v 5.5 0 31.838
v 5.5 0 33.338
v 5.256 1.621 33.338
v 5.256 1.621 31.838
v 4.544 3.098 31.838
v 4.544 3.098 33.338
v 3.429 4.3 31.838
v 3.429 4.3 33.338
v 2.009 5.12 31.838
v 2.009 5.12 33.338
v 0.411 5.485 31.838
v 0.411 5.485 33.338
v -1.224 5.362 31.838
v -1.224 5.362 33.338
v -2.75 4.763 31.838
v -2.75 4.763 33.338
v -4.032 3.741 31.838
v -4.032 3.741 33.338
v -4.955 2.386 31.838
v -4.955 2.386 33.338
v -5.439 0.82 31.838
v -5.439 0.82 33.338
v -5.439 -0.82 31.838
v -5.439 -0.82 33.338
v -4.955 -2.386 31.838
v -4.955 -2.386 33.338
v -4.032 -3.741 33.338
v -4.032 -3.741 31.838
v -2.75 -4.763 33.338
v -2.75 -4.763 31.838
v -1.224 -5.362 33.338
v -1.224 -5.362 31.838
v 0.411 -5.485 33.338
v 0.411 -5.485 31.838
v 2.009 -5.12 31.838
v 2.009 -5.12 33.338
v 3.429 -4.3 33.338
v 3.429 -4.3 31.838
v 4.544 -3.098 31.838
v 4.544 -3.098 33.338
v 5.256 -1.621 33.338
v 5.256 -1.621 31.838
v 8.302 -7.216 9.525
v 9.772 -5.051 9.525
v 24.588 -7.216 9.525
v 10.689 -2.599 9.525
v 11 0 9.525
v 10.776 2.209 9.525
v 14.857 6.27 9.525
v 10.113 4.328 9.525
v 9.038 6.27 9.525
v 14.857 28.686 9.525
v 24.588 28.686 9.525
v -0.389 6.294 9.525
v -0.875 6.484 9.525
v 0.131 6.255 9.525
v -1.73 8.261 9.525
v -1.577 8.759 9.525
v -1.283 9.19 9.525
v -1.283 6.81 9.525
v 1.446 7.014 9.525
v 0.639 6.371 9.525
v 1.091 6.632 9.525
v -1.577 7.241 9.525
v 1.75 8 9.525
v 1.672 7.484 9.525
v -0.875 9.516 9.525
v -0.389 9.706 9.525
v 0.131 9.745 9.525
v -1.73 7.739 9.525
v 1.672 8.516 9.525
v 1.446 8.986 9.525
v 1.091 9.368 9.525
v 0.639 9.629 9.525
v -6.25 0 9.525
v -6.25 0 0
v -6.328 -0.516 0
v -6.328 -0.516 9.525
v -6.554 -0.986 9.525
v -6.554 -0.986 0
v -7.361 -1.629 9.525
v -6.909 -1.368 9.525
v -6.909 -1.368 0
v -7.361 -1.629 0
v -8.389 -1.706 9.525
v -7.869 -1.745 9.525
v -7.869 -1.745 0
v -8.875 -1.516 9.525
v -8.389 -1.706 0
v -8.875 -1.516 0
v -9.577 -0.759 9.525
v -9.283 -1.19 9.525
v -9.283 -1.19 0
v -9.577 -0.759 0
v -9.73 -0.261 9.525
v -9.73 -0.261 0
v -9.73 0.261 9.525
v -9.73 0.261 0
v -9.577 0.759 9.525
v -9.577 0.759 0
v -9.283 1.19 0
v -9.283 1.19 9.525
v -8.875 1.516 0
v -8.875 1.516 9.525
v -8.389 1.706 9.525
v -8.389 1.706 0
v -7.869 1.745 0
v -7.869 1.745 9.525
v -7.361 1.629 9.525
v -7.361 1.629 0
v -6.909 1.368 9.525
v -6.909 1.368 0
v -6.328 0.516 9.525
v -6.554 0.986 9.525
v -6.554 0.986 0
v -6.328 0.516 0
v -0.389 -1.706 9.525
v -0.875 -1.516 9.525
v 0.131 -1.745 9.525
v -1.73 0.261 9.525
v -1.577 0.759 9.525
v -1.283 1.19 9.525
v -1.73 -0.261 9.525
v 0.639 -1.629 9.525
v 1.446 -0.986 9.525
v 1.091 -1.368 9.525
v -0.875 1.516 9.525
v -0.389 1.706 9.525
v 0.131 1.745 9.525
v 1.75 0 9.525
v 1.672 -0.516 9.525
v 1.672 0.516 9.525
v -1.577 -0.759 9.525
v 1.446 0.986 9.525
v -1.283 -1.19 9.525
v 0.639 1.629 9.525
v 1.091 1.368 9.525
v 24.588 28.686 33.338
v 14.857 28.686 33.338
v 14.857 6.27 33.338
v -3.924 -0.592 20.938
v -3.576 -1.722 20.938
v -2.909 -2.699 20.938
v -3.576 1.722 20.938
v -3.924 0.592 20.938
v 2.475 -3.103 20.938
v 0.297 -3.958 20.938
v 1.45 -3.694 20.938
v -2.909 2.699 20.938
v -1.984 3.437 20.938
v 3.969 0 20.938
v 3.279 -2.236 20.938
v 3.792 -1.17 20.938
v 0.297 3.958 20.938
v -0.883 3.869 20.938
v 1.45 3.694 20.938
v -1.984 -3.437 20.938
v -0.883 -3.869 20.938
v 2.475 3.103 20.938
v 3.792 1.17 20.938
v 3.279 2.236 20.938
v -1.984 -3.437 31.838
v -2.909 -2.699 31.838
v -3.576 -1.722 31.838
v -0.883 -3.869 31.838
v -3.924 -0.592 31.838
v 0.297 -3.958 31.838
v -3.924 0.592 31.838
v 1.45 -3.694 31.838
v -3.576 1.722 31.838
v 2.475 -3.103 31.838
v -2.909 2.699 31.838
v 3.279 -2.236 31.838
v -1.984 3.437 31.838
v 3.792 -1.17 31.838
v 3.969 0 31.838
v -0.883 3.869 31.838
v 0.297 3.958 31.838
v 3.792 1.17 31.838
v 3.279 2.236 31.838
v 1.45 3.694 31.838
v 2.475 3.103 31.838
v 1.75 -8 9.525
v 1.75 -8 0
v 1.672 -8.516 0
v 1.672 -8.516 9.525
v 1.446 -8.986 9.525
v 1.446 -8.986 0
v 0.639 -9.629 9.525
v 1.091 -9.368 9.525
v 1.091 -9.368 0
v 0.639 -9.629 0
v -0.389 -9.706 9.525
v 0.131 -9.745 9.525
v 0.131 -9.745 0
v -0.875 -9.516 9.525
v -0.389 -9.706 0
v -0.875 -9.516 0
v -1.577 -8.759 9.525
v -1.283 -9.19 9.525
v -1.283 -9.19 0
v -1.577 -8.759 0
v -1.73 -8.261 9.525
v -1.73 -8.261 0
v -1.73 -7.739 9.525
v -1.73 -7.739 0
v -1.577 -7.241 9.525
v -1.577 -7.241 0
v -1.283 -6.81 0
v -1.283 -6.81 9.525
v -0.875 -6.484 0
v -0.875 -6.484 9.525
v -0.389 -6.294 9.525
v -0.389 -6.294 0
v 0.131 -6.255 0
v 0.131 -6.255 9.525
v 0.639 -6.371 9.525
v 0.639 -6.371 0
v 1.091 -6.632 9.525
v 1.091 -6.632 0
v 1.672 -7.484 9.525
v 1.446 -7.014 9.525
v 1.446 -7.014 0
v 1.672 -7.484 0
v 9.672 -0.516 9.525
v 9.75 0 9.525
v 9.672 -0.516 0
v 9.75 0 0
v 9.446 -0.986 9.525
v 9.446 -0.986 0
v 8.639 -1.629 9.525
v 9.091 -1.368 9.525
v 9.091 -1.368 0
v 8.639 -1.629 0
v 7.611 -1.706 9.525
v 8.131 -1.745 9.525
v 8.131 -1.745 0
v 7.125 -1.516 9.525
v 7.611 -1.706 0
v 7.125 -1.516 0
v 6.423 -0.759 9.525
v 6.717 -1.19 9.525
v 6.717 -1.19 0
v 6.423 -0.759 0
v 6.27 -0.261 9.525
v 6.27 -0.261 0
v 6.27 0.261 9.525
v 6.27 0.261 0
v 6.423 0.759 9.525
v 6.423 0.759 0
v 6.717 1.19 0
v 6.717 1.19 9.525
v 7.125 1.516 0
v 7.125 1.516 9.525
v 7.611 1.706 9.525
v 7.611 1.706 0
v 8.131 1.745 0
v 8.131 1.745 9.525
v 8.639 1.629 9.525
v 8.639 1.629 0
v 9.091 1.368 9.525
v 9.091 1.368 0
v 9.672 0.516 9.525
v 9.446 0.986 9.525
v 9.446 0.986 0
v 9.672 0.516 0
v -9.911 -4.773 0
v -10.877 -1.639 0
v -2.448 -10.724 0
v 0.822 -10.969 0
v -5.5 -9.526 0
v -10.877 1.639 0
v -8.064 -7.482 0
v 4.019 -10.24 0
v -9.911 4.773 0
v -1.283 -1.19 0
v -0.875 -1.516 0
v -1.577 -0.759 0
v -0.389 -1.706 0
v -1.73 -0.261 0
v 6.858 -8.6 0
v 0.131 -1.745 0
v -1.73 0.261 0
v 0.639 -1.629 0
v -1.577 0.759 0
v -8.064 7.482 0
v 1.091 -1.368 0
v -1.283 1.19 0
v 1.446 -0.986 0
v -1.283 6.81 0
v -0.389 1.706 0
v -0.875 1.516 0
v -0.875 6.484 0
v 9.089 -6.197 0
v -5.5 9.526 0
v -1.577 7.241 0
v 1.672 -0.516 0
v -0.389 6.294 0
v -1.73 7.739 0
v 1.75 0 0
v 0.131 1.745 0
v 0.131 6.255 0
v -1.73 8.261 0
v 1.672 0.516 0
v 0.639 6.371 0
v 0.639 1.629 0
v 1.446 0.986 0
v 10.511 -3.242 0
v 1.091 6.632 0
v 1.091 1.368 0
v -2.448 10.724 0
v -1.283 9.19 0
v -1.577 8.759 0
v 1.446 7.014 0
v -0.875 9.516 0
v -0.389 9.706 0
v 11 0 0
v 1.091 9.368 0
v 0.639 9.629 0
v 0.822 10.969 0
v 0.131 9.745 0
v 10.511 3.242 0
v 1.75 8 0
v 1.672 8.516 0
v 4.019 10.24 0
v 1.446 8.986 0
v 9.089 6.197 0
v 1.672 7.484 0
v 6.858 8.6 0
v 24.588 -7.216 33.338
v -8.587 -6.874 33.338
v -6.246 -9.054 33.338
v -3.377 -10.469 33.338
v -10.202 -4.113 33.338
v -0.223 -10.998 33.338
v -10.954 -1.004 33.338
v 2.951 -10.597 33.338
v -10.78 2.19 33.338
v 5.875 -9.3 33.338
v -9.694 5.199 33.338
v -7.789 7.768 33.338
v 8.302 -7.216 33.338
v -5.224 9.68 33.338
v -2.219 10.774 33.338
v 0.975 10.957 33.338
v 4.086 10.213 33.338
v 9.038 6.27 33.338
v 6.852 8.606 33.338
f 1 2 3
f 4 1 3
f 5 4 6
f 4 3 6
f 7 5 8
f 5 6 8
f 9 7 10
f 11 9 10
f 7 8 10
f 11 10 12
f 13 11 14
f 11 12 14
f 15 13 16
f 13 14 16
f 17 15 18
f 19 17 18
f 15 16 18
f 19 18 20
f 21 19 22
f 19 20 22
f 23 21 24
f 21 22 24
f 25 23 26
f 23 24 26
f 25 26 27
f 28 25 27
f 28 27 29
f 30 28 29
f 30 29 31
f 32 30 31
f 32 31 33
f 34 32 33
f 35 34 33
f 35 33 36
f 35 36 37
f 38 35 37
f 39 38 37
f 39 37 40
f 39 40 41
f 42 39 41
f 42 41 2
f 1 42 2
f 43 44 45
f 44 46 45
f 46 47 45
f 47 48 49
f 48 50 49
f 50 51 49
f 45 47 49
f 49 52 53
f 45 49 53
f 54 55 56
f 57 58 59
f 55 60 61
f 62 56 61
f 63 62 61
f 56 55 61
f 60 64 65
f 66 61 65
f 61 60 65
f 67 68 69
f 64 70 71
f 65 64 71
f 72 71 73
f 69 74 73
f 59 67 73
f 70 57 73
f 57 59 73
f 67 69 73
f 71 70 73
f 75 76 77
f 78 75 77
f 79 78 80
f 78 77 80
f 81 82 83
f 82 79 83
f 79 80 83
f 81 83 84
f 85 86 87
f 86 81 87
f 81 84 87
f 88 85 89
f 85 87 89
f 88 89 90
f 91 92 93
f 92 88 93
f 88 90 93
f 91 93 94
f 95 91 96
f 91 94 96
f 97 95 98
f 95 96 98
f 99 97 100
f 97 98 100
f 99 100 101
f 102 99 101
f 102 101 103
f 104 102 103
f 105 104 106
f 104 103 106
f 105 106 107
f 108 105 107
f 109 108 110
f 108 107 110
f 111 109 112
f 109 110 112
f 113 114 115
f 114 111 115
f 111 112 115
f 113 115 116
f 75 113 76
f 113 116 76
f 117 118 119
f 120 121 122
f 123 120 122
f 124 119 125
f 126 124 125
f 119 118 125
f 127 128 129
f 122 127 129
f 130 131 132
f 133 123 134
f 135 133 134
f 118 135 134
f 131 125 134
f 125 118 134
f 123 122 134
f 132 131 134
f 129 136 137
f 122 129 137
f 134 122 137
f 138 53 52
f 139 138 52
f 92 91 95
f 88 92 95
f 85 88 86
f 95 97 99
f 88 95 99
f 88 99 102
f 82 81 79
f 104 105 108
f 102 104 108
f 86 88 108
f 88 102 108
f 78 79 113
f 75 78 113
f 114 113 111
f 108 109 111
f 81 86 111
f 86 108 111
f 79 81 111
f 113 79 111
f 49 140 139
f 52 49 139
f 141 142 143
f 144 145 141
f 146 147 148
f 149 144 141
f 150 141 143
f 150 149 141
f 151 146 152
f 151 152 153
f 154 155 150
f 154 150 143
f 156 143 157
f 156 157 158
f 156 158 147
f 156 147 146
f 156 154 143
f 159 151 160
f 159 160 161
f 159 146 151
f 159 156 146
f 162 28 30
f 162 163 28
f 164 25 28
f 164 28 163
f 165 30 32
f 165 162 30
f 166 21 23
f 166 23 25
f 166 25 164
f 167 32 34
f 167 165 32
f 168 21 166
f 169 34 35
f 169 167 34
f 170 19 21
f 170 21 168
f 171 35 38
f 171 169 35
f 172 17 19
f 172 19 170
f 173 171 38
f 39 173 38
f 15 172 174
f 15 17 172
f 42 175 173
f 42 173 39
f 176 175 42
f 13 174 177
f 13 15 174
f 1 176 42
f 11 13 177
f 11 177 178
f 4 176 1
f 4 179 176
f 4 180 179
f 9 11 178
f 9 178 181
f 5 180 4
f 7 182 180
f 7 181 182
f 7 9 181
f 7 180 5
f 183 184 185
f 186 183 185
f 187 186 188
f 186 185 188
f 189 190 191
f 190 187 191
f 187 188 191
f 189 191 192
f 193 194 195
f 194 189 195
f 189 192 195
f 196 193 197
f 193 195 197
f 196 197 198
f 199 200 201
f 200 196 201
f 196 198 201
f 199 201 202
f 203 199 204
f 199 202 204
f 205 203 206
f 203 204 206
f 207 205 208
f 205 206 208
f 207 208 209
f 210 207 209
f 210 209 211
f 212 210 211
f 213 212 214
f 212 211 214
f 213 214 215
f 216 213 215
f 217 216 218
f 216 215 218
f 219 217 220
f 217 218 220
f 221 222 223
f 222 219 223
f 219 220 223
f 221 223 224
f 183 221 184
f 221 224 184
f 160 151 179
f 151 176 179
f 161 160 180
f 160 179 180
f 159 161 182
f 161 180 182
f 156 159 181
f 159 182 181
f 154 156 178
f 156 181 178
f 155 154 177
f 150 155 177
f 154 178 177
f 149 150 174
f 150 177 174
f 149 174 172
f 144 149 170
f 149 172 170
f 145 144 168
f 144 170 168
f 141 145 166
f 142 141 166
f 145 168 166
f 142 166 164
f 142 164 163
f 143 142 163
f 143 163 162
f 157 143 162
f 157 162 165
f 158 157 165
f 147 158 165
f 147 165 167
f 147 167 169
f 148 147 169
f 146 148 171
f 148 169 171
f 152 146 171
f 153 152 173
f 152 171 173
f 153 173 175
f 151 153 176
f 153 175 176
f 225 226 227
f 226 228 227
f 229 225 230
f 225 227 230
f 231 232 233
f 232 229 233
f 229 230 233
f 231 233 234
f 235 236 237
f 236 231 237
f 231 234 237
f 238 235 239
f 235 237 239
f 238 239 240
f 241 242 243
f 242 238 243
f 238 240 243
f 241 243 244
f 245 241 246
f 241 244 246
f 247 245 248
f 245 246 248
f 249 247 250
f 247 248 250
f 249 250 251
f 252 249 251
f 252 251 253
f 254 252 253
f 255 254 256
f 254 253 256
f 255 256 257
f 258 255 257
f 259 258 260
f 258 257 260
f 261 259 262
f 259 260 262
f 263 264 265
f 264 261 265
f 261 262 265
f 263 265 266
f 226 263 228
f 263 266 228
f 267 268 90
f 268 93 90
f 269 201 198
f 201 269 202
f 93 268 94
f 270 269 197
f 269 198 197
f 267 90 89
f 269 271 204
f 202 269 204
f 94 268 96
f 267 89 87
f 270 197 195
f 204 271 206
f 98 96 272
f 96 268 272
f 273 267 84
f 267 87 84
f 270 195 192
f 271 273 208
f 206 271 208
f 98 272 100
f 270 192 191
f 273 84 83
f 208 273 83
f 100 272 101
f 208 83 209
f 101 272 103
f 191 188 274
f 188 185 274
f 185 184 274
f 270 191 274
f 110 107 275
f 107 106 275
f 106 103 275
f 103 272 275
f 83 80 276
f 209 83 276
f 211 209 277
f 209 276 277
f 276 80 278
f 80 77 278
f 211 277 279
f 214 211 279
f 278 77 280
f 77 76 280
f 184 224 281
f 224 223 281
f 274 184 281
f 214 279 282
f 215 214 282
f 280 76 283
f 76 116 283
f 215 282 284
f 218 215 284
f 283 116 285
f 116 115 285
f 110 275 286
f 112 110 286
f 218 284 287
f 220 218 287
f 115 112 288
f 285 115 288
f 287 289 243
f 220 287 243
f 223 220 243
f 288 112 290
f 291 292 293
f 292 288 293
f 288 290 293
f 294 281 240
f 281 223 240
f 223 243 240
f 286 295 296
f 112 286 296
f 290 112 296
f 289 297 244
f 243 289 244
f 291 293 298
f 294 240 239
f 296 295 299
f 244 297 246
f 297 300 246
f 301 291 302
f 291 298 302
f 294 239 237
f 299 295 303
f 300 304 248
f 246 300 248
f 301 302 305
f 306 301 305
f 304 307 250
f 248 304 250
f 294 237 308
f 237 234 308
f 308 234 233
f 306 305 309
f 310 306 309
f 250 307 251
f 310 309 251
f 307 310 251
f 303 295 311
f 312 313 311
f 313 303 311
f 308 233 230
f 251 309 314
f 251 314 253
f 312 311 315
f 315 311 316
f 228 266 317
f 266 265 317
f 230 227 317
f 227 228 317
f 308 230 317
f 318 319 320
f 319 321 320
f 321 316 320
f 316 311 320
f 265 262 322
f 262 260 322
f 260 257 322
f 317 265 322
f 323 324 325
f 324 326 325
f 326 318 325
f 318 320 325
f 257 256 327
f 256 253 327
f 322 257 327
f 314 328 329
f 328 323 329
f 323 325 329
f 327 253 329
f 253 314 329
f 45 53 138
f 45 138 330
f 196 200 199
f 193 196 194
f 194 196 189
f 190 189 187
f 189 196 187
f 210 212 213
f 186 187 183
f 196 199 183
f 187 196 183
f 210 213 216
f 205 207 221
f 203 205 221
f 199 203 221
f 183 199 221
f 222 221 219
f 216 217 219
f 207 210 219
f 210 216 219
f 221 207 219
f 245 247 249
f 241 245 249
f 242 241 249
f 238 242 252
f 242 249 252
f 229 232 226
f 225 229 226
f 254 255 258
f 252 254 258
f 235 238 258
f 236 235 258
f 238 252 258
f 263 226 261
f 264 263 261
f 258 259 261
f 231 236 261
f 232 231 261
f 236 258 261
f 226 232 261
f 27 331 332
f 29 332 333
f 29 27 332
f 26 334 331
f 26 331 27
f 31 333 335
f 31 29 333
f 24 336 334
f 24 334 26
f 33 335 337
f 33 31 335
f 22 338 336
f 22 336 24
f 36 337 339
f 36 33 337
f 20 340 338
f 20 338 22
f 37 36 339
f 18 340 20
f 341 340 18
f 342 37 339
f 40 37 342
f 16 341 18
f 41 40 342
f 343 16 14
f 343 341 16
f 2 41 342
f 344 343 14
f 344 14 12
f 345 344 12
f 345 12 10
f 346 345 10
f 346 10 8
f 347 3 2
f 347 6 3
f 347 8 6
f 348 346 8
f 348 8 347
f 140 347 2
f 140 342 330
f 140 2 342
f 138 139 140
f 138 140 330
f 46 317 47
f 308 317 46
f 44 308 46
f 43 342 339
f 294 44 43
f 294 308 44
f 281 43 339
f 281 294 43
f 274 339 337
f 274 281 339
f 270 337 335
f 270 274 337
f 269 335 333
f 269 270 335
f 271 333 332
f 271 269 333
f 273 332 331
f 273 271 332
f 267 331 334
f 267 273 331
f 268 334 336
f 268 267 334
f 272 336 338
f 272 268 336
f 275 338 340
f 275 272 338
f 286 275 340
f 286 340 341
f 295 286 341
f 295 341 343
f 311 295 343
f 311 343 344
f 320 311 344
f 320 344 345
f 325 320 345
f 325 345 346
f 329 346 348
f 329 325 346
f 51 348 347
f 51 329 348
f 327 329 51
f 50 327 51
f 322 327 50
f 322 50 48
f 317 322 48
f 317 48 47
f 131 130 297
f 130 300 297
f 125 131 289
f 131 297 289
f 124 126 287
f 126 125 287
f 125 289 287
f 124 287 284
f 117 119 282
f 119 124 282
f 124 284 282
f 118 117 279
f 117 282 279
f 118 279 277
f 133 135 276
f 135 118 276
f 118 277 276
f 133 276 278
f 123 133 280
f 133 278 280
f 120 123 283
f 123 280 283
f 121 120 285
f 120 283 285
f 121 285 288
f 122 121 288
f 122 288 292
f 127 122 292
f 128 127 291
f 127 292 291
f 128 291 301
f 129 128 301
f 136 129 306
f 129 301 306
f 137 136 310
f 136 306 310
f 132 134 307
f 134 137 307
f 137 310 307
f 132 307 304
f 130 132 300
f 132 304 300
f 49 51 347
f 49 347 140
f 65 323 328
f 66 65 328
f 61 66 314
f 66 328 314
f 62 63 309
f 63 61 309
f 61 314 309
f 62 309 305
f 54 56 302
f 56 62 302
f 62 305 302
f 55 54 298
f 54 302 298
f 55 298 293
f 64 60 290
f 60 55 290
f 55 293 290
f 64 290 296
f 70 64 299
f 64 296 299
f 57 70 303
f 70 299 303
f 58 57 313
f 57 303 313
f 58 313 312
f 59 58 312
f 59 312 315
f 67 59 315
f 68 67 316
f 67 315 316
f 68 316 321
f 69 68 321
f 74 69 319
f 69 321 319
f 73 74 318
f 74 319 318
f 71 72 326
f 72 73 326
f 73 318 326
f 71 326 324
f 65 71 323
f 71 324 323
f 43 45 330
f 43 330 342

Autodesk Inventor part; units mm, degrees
ref_plane "YZ Plane" through (0, 0, 0) normal (1, 0, 0) x (0, 1, 0)
ref_plane "XZ Plane" through (0, 0, 0) normal (0, 1, 0) x (-1, 0, 0)
ref_plane "XY Plane" through (0, 0, 0) normal (0, 0, 1) x (1, 0, 0)
sketch "Sketch1" plane through (0, 0, 0) normal (0, 0, 1) x (1, 0, 0)
  circle A0 centre (0, 0) radius 11 projected
  circle A1 centre (0, 0) radius 1.75 projected
  circle A2 centre (-8, 0) radius 1.75 projected
  circle A3 centre (0, 8) radius 1.75 projected
  circle A4 centre (8, 0) radius 1.75 projected
  circle A5 centre (0, -8) radius 1.75 projected
extrude "Extrusion1" add sketch "Sketch1" along normal blind 9.525
sketch "Sketch2" plane through (0, 0, 9.525) normal (0, 0, 1) x (1, 0, 0)
  circle A0 centre (0, 0) radius 11 projected
  line L0 (9.0377, 6.2705) -> (14.8574, 6.2705)
  line L1 (14.8574, 6.2705) -> (14.8574, 19.7717)
  line L2 (22.8575, 28.6861) -> (24.5877, 28.6861)
  line L3 (24.5877, 28.6861) -> (24.5877, -7.2164)
  line L4 (24.5877, -7.2164) -> (8.302, -7.2164)
  line L5 (22.8575, 28.6861) -> (14.8574, 28.6861)
  line L6 (14.8574, 19.7717) -> (14.8574, 28.6861)
  point P0 (-11, -11)
extrude "Extrusion2" add sketch "Sketch2" along normal blind 23.8125
sketch "Sketch3" plane through (0, 0, 33.3375) normal (0, 0, 1) x (1, 0, 0)
  circle A0 centre (0, 0) radius 3.9688
  dimension "d4" = 7.9375
extrude "Extrusion3" cut sketch "Sketch3" against normal blind 12.4
sketch "Sketch4" plane through (0, 0, 33.3375) normal (0, 0, 1) x (1, 0, 0)
  circle A0 centre (0, 0) radius 5.5
  dimension "d7" = 11
extrude "Extrusion4" cut sketch "Sketch4" against normal blind 1.5
properties part number "goal holder flipped"
